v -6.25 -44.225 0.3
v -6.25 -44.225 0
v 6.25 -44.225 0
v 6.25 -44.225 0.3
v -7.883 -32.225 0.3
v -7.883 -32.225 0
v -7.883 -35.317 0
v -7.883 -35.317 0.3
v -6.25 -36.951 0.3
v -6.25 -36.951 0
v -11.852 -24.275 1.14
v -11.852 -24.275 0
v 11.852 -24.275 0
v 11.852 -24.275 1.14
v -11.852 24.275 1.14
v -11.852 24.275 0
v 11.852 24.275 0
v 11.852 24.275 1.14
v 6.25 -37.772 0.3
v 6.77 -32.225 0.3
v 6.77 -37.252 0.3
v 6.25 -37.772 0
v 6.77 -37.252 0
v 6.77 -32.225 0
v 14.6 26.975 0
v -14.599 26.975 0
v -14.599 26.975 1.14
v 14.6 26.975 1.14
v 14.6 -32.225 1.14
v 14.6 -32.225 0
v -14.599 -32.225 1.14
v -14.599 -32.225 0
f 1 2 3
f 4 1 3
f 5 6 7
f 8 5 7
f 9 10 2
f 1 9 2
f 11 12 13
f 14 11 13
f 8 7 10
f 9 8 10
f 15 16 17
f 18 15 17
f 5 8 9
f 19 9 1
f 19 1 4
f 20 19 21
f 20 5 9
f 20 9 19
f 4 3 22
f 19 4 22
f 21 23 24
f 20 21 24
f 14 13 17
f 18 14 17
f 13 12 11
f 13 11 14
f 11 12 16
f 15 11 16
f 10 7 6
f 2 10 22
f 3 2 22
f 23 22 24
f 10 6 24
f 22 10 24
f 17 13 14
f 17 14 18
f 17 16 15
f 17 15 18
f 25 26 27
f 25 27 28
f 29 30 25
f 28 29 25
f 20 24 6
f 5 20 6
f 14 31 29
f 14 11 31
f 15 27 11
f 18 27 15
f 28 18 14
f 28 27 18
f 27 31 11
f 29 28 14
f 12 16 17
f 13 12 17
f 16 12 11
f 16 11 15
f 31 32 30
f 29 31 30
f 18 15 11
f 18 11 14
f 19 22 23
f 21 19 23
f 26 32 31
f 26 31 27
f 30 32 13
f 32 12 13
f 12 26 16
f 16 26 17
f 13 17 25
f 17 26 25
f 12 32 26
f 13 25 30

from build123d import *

# Parameters (mm, degrees)
SKETCH1_W           = 23.705
SKETCH1_H           = 48.55
BOSS_EXTRUDE1_DEPTH = 1.14
SKETCH1_3_W         = 23.705
SKETCH1_3_H         = 48.55
BOSS_EXTRUDE2_DEPTH = 1.14
BOSS_EXTRUDE3_DEPTH = 0.3


with BuildPart() as part:
    # Sketch1 → Boss-Extrude1 (new body)
    with BuildSketch(Plane.XY):
        Rectangle(SKETCH1_W, SKETCH1_H)
    extrude(amount=BOSS_EXTRUDE1_DEPTH)


with BuildPart() as body_2:
    # Sketch1<3> → Boss-Extrude2 (new body)
    with BuildSketch(Plane.XY):
        Polygon((-14.5995, -32.225), (-7.883036535, -32.225), (6.770331425, -32.225), (14.6005, -32.225), (14.6005, 26.975), (-14.5995, 26.975), align=None)
        Rectangle(SKETCH1_3_W, SKETCH1_3_H, mode=Mode.SUBTRACT)
    extrude(amount=BOSS_EXTRUDE2_DEPTH)


with BuildPart() as body_3:
    # Sketch1<4> → Boss-Extrude3 (new body)
    with BuildSketch(Plane.XY):
        Polygon((6.770331425, -32.225), (-7.883036535, -32.225), (-7.883036535, -35.317247683), (-6.2495, -36.950784218), (-6.2495, -44.225), (6.2505, -44.225), (6.2505, -37.771811116), (6.770331425, -37.251979691), align=None)
    extrude(amount=BOSS_EXTRUDE3_DEPTH)


solid = Compound([part.part, body_2.part, body_3.part])
